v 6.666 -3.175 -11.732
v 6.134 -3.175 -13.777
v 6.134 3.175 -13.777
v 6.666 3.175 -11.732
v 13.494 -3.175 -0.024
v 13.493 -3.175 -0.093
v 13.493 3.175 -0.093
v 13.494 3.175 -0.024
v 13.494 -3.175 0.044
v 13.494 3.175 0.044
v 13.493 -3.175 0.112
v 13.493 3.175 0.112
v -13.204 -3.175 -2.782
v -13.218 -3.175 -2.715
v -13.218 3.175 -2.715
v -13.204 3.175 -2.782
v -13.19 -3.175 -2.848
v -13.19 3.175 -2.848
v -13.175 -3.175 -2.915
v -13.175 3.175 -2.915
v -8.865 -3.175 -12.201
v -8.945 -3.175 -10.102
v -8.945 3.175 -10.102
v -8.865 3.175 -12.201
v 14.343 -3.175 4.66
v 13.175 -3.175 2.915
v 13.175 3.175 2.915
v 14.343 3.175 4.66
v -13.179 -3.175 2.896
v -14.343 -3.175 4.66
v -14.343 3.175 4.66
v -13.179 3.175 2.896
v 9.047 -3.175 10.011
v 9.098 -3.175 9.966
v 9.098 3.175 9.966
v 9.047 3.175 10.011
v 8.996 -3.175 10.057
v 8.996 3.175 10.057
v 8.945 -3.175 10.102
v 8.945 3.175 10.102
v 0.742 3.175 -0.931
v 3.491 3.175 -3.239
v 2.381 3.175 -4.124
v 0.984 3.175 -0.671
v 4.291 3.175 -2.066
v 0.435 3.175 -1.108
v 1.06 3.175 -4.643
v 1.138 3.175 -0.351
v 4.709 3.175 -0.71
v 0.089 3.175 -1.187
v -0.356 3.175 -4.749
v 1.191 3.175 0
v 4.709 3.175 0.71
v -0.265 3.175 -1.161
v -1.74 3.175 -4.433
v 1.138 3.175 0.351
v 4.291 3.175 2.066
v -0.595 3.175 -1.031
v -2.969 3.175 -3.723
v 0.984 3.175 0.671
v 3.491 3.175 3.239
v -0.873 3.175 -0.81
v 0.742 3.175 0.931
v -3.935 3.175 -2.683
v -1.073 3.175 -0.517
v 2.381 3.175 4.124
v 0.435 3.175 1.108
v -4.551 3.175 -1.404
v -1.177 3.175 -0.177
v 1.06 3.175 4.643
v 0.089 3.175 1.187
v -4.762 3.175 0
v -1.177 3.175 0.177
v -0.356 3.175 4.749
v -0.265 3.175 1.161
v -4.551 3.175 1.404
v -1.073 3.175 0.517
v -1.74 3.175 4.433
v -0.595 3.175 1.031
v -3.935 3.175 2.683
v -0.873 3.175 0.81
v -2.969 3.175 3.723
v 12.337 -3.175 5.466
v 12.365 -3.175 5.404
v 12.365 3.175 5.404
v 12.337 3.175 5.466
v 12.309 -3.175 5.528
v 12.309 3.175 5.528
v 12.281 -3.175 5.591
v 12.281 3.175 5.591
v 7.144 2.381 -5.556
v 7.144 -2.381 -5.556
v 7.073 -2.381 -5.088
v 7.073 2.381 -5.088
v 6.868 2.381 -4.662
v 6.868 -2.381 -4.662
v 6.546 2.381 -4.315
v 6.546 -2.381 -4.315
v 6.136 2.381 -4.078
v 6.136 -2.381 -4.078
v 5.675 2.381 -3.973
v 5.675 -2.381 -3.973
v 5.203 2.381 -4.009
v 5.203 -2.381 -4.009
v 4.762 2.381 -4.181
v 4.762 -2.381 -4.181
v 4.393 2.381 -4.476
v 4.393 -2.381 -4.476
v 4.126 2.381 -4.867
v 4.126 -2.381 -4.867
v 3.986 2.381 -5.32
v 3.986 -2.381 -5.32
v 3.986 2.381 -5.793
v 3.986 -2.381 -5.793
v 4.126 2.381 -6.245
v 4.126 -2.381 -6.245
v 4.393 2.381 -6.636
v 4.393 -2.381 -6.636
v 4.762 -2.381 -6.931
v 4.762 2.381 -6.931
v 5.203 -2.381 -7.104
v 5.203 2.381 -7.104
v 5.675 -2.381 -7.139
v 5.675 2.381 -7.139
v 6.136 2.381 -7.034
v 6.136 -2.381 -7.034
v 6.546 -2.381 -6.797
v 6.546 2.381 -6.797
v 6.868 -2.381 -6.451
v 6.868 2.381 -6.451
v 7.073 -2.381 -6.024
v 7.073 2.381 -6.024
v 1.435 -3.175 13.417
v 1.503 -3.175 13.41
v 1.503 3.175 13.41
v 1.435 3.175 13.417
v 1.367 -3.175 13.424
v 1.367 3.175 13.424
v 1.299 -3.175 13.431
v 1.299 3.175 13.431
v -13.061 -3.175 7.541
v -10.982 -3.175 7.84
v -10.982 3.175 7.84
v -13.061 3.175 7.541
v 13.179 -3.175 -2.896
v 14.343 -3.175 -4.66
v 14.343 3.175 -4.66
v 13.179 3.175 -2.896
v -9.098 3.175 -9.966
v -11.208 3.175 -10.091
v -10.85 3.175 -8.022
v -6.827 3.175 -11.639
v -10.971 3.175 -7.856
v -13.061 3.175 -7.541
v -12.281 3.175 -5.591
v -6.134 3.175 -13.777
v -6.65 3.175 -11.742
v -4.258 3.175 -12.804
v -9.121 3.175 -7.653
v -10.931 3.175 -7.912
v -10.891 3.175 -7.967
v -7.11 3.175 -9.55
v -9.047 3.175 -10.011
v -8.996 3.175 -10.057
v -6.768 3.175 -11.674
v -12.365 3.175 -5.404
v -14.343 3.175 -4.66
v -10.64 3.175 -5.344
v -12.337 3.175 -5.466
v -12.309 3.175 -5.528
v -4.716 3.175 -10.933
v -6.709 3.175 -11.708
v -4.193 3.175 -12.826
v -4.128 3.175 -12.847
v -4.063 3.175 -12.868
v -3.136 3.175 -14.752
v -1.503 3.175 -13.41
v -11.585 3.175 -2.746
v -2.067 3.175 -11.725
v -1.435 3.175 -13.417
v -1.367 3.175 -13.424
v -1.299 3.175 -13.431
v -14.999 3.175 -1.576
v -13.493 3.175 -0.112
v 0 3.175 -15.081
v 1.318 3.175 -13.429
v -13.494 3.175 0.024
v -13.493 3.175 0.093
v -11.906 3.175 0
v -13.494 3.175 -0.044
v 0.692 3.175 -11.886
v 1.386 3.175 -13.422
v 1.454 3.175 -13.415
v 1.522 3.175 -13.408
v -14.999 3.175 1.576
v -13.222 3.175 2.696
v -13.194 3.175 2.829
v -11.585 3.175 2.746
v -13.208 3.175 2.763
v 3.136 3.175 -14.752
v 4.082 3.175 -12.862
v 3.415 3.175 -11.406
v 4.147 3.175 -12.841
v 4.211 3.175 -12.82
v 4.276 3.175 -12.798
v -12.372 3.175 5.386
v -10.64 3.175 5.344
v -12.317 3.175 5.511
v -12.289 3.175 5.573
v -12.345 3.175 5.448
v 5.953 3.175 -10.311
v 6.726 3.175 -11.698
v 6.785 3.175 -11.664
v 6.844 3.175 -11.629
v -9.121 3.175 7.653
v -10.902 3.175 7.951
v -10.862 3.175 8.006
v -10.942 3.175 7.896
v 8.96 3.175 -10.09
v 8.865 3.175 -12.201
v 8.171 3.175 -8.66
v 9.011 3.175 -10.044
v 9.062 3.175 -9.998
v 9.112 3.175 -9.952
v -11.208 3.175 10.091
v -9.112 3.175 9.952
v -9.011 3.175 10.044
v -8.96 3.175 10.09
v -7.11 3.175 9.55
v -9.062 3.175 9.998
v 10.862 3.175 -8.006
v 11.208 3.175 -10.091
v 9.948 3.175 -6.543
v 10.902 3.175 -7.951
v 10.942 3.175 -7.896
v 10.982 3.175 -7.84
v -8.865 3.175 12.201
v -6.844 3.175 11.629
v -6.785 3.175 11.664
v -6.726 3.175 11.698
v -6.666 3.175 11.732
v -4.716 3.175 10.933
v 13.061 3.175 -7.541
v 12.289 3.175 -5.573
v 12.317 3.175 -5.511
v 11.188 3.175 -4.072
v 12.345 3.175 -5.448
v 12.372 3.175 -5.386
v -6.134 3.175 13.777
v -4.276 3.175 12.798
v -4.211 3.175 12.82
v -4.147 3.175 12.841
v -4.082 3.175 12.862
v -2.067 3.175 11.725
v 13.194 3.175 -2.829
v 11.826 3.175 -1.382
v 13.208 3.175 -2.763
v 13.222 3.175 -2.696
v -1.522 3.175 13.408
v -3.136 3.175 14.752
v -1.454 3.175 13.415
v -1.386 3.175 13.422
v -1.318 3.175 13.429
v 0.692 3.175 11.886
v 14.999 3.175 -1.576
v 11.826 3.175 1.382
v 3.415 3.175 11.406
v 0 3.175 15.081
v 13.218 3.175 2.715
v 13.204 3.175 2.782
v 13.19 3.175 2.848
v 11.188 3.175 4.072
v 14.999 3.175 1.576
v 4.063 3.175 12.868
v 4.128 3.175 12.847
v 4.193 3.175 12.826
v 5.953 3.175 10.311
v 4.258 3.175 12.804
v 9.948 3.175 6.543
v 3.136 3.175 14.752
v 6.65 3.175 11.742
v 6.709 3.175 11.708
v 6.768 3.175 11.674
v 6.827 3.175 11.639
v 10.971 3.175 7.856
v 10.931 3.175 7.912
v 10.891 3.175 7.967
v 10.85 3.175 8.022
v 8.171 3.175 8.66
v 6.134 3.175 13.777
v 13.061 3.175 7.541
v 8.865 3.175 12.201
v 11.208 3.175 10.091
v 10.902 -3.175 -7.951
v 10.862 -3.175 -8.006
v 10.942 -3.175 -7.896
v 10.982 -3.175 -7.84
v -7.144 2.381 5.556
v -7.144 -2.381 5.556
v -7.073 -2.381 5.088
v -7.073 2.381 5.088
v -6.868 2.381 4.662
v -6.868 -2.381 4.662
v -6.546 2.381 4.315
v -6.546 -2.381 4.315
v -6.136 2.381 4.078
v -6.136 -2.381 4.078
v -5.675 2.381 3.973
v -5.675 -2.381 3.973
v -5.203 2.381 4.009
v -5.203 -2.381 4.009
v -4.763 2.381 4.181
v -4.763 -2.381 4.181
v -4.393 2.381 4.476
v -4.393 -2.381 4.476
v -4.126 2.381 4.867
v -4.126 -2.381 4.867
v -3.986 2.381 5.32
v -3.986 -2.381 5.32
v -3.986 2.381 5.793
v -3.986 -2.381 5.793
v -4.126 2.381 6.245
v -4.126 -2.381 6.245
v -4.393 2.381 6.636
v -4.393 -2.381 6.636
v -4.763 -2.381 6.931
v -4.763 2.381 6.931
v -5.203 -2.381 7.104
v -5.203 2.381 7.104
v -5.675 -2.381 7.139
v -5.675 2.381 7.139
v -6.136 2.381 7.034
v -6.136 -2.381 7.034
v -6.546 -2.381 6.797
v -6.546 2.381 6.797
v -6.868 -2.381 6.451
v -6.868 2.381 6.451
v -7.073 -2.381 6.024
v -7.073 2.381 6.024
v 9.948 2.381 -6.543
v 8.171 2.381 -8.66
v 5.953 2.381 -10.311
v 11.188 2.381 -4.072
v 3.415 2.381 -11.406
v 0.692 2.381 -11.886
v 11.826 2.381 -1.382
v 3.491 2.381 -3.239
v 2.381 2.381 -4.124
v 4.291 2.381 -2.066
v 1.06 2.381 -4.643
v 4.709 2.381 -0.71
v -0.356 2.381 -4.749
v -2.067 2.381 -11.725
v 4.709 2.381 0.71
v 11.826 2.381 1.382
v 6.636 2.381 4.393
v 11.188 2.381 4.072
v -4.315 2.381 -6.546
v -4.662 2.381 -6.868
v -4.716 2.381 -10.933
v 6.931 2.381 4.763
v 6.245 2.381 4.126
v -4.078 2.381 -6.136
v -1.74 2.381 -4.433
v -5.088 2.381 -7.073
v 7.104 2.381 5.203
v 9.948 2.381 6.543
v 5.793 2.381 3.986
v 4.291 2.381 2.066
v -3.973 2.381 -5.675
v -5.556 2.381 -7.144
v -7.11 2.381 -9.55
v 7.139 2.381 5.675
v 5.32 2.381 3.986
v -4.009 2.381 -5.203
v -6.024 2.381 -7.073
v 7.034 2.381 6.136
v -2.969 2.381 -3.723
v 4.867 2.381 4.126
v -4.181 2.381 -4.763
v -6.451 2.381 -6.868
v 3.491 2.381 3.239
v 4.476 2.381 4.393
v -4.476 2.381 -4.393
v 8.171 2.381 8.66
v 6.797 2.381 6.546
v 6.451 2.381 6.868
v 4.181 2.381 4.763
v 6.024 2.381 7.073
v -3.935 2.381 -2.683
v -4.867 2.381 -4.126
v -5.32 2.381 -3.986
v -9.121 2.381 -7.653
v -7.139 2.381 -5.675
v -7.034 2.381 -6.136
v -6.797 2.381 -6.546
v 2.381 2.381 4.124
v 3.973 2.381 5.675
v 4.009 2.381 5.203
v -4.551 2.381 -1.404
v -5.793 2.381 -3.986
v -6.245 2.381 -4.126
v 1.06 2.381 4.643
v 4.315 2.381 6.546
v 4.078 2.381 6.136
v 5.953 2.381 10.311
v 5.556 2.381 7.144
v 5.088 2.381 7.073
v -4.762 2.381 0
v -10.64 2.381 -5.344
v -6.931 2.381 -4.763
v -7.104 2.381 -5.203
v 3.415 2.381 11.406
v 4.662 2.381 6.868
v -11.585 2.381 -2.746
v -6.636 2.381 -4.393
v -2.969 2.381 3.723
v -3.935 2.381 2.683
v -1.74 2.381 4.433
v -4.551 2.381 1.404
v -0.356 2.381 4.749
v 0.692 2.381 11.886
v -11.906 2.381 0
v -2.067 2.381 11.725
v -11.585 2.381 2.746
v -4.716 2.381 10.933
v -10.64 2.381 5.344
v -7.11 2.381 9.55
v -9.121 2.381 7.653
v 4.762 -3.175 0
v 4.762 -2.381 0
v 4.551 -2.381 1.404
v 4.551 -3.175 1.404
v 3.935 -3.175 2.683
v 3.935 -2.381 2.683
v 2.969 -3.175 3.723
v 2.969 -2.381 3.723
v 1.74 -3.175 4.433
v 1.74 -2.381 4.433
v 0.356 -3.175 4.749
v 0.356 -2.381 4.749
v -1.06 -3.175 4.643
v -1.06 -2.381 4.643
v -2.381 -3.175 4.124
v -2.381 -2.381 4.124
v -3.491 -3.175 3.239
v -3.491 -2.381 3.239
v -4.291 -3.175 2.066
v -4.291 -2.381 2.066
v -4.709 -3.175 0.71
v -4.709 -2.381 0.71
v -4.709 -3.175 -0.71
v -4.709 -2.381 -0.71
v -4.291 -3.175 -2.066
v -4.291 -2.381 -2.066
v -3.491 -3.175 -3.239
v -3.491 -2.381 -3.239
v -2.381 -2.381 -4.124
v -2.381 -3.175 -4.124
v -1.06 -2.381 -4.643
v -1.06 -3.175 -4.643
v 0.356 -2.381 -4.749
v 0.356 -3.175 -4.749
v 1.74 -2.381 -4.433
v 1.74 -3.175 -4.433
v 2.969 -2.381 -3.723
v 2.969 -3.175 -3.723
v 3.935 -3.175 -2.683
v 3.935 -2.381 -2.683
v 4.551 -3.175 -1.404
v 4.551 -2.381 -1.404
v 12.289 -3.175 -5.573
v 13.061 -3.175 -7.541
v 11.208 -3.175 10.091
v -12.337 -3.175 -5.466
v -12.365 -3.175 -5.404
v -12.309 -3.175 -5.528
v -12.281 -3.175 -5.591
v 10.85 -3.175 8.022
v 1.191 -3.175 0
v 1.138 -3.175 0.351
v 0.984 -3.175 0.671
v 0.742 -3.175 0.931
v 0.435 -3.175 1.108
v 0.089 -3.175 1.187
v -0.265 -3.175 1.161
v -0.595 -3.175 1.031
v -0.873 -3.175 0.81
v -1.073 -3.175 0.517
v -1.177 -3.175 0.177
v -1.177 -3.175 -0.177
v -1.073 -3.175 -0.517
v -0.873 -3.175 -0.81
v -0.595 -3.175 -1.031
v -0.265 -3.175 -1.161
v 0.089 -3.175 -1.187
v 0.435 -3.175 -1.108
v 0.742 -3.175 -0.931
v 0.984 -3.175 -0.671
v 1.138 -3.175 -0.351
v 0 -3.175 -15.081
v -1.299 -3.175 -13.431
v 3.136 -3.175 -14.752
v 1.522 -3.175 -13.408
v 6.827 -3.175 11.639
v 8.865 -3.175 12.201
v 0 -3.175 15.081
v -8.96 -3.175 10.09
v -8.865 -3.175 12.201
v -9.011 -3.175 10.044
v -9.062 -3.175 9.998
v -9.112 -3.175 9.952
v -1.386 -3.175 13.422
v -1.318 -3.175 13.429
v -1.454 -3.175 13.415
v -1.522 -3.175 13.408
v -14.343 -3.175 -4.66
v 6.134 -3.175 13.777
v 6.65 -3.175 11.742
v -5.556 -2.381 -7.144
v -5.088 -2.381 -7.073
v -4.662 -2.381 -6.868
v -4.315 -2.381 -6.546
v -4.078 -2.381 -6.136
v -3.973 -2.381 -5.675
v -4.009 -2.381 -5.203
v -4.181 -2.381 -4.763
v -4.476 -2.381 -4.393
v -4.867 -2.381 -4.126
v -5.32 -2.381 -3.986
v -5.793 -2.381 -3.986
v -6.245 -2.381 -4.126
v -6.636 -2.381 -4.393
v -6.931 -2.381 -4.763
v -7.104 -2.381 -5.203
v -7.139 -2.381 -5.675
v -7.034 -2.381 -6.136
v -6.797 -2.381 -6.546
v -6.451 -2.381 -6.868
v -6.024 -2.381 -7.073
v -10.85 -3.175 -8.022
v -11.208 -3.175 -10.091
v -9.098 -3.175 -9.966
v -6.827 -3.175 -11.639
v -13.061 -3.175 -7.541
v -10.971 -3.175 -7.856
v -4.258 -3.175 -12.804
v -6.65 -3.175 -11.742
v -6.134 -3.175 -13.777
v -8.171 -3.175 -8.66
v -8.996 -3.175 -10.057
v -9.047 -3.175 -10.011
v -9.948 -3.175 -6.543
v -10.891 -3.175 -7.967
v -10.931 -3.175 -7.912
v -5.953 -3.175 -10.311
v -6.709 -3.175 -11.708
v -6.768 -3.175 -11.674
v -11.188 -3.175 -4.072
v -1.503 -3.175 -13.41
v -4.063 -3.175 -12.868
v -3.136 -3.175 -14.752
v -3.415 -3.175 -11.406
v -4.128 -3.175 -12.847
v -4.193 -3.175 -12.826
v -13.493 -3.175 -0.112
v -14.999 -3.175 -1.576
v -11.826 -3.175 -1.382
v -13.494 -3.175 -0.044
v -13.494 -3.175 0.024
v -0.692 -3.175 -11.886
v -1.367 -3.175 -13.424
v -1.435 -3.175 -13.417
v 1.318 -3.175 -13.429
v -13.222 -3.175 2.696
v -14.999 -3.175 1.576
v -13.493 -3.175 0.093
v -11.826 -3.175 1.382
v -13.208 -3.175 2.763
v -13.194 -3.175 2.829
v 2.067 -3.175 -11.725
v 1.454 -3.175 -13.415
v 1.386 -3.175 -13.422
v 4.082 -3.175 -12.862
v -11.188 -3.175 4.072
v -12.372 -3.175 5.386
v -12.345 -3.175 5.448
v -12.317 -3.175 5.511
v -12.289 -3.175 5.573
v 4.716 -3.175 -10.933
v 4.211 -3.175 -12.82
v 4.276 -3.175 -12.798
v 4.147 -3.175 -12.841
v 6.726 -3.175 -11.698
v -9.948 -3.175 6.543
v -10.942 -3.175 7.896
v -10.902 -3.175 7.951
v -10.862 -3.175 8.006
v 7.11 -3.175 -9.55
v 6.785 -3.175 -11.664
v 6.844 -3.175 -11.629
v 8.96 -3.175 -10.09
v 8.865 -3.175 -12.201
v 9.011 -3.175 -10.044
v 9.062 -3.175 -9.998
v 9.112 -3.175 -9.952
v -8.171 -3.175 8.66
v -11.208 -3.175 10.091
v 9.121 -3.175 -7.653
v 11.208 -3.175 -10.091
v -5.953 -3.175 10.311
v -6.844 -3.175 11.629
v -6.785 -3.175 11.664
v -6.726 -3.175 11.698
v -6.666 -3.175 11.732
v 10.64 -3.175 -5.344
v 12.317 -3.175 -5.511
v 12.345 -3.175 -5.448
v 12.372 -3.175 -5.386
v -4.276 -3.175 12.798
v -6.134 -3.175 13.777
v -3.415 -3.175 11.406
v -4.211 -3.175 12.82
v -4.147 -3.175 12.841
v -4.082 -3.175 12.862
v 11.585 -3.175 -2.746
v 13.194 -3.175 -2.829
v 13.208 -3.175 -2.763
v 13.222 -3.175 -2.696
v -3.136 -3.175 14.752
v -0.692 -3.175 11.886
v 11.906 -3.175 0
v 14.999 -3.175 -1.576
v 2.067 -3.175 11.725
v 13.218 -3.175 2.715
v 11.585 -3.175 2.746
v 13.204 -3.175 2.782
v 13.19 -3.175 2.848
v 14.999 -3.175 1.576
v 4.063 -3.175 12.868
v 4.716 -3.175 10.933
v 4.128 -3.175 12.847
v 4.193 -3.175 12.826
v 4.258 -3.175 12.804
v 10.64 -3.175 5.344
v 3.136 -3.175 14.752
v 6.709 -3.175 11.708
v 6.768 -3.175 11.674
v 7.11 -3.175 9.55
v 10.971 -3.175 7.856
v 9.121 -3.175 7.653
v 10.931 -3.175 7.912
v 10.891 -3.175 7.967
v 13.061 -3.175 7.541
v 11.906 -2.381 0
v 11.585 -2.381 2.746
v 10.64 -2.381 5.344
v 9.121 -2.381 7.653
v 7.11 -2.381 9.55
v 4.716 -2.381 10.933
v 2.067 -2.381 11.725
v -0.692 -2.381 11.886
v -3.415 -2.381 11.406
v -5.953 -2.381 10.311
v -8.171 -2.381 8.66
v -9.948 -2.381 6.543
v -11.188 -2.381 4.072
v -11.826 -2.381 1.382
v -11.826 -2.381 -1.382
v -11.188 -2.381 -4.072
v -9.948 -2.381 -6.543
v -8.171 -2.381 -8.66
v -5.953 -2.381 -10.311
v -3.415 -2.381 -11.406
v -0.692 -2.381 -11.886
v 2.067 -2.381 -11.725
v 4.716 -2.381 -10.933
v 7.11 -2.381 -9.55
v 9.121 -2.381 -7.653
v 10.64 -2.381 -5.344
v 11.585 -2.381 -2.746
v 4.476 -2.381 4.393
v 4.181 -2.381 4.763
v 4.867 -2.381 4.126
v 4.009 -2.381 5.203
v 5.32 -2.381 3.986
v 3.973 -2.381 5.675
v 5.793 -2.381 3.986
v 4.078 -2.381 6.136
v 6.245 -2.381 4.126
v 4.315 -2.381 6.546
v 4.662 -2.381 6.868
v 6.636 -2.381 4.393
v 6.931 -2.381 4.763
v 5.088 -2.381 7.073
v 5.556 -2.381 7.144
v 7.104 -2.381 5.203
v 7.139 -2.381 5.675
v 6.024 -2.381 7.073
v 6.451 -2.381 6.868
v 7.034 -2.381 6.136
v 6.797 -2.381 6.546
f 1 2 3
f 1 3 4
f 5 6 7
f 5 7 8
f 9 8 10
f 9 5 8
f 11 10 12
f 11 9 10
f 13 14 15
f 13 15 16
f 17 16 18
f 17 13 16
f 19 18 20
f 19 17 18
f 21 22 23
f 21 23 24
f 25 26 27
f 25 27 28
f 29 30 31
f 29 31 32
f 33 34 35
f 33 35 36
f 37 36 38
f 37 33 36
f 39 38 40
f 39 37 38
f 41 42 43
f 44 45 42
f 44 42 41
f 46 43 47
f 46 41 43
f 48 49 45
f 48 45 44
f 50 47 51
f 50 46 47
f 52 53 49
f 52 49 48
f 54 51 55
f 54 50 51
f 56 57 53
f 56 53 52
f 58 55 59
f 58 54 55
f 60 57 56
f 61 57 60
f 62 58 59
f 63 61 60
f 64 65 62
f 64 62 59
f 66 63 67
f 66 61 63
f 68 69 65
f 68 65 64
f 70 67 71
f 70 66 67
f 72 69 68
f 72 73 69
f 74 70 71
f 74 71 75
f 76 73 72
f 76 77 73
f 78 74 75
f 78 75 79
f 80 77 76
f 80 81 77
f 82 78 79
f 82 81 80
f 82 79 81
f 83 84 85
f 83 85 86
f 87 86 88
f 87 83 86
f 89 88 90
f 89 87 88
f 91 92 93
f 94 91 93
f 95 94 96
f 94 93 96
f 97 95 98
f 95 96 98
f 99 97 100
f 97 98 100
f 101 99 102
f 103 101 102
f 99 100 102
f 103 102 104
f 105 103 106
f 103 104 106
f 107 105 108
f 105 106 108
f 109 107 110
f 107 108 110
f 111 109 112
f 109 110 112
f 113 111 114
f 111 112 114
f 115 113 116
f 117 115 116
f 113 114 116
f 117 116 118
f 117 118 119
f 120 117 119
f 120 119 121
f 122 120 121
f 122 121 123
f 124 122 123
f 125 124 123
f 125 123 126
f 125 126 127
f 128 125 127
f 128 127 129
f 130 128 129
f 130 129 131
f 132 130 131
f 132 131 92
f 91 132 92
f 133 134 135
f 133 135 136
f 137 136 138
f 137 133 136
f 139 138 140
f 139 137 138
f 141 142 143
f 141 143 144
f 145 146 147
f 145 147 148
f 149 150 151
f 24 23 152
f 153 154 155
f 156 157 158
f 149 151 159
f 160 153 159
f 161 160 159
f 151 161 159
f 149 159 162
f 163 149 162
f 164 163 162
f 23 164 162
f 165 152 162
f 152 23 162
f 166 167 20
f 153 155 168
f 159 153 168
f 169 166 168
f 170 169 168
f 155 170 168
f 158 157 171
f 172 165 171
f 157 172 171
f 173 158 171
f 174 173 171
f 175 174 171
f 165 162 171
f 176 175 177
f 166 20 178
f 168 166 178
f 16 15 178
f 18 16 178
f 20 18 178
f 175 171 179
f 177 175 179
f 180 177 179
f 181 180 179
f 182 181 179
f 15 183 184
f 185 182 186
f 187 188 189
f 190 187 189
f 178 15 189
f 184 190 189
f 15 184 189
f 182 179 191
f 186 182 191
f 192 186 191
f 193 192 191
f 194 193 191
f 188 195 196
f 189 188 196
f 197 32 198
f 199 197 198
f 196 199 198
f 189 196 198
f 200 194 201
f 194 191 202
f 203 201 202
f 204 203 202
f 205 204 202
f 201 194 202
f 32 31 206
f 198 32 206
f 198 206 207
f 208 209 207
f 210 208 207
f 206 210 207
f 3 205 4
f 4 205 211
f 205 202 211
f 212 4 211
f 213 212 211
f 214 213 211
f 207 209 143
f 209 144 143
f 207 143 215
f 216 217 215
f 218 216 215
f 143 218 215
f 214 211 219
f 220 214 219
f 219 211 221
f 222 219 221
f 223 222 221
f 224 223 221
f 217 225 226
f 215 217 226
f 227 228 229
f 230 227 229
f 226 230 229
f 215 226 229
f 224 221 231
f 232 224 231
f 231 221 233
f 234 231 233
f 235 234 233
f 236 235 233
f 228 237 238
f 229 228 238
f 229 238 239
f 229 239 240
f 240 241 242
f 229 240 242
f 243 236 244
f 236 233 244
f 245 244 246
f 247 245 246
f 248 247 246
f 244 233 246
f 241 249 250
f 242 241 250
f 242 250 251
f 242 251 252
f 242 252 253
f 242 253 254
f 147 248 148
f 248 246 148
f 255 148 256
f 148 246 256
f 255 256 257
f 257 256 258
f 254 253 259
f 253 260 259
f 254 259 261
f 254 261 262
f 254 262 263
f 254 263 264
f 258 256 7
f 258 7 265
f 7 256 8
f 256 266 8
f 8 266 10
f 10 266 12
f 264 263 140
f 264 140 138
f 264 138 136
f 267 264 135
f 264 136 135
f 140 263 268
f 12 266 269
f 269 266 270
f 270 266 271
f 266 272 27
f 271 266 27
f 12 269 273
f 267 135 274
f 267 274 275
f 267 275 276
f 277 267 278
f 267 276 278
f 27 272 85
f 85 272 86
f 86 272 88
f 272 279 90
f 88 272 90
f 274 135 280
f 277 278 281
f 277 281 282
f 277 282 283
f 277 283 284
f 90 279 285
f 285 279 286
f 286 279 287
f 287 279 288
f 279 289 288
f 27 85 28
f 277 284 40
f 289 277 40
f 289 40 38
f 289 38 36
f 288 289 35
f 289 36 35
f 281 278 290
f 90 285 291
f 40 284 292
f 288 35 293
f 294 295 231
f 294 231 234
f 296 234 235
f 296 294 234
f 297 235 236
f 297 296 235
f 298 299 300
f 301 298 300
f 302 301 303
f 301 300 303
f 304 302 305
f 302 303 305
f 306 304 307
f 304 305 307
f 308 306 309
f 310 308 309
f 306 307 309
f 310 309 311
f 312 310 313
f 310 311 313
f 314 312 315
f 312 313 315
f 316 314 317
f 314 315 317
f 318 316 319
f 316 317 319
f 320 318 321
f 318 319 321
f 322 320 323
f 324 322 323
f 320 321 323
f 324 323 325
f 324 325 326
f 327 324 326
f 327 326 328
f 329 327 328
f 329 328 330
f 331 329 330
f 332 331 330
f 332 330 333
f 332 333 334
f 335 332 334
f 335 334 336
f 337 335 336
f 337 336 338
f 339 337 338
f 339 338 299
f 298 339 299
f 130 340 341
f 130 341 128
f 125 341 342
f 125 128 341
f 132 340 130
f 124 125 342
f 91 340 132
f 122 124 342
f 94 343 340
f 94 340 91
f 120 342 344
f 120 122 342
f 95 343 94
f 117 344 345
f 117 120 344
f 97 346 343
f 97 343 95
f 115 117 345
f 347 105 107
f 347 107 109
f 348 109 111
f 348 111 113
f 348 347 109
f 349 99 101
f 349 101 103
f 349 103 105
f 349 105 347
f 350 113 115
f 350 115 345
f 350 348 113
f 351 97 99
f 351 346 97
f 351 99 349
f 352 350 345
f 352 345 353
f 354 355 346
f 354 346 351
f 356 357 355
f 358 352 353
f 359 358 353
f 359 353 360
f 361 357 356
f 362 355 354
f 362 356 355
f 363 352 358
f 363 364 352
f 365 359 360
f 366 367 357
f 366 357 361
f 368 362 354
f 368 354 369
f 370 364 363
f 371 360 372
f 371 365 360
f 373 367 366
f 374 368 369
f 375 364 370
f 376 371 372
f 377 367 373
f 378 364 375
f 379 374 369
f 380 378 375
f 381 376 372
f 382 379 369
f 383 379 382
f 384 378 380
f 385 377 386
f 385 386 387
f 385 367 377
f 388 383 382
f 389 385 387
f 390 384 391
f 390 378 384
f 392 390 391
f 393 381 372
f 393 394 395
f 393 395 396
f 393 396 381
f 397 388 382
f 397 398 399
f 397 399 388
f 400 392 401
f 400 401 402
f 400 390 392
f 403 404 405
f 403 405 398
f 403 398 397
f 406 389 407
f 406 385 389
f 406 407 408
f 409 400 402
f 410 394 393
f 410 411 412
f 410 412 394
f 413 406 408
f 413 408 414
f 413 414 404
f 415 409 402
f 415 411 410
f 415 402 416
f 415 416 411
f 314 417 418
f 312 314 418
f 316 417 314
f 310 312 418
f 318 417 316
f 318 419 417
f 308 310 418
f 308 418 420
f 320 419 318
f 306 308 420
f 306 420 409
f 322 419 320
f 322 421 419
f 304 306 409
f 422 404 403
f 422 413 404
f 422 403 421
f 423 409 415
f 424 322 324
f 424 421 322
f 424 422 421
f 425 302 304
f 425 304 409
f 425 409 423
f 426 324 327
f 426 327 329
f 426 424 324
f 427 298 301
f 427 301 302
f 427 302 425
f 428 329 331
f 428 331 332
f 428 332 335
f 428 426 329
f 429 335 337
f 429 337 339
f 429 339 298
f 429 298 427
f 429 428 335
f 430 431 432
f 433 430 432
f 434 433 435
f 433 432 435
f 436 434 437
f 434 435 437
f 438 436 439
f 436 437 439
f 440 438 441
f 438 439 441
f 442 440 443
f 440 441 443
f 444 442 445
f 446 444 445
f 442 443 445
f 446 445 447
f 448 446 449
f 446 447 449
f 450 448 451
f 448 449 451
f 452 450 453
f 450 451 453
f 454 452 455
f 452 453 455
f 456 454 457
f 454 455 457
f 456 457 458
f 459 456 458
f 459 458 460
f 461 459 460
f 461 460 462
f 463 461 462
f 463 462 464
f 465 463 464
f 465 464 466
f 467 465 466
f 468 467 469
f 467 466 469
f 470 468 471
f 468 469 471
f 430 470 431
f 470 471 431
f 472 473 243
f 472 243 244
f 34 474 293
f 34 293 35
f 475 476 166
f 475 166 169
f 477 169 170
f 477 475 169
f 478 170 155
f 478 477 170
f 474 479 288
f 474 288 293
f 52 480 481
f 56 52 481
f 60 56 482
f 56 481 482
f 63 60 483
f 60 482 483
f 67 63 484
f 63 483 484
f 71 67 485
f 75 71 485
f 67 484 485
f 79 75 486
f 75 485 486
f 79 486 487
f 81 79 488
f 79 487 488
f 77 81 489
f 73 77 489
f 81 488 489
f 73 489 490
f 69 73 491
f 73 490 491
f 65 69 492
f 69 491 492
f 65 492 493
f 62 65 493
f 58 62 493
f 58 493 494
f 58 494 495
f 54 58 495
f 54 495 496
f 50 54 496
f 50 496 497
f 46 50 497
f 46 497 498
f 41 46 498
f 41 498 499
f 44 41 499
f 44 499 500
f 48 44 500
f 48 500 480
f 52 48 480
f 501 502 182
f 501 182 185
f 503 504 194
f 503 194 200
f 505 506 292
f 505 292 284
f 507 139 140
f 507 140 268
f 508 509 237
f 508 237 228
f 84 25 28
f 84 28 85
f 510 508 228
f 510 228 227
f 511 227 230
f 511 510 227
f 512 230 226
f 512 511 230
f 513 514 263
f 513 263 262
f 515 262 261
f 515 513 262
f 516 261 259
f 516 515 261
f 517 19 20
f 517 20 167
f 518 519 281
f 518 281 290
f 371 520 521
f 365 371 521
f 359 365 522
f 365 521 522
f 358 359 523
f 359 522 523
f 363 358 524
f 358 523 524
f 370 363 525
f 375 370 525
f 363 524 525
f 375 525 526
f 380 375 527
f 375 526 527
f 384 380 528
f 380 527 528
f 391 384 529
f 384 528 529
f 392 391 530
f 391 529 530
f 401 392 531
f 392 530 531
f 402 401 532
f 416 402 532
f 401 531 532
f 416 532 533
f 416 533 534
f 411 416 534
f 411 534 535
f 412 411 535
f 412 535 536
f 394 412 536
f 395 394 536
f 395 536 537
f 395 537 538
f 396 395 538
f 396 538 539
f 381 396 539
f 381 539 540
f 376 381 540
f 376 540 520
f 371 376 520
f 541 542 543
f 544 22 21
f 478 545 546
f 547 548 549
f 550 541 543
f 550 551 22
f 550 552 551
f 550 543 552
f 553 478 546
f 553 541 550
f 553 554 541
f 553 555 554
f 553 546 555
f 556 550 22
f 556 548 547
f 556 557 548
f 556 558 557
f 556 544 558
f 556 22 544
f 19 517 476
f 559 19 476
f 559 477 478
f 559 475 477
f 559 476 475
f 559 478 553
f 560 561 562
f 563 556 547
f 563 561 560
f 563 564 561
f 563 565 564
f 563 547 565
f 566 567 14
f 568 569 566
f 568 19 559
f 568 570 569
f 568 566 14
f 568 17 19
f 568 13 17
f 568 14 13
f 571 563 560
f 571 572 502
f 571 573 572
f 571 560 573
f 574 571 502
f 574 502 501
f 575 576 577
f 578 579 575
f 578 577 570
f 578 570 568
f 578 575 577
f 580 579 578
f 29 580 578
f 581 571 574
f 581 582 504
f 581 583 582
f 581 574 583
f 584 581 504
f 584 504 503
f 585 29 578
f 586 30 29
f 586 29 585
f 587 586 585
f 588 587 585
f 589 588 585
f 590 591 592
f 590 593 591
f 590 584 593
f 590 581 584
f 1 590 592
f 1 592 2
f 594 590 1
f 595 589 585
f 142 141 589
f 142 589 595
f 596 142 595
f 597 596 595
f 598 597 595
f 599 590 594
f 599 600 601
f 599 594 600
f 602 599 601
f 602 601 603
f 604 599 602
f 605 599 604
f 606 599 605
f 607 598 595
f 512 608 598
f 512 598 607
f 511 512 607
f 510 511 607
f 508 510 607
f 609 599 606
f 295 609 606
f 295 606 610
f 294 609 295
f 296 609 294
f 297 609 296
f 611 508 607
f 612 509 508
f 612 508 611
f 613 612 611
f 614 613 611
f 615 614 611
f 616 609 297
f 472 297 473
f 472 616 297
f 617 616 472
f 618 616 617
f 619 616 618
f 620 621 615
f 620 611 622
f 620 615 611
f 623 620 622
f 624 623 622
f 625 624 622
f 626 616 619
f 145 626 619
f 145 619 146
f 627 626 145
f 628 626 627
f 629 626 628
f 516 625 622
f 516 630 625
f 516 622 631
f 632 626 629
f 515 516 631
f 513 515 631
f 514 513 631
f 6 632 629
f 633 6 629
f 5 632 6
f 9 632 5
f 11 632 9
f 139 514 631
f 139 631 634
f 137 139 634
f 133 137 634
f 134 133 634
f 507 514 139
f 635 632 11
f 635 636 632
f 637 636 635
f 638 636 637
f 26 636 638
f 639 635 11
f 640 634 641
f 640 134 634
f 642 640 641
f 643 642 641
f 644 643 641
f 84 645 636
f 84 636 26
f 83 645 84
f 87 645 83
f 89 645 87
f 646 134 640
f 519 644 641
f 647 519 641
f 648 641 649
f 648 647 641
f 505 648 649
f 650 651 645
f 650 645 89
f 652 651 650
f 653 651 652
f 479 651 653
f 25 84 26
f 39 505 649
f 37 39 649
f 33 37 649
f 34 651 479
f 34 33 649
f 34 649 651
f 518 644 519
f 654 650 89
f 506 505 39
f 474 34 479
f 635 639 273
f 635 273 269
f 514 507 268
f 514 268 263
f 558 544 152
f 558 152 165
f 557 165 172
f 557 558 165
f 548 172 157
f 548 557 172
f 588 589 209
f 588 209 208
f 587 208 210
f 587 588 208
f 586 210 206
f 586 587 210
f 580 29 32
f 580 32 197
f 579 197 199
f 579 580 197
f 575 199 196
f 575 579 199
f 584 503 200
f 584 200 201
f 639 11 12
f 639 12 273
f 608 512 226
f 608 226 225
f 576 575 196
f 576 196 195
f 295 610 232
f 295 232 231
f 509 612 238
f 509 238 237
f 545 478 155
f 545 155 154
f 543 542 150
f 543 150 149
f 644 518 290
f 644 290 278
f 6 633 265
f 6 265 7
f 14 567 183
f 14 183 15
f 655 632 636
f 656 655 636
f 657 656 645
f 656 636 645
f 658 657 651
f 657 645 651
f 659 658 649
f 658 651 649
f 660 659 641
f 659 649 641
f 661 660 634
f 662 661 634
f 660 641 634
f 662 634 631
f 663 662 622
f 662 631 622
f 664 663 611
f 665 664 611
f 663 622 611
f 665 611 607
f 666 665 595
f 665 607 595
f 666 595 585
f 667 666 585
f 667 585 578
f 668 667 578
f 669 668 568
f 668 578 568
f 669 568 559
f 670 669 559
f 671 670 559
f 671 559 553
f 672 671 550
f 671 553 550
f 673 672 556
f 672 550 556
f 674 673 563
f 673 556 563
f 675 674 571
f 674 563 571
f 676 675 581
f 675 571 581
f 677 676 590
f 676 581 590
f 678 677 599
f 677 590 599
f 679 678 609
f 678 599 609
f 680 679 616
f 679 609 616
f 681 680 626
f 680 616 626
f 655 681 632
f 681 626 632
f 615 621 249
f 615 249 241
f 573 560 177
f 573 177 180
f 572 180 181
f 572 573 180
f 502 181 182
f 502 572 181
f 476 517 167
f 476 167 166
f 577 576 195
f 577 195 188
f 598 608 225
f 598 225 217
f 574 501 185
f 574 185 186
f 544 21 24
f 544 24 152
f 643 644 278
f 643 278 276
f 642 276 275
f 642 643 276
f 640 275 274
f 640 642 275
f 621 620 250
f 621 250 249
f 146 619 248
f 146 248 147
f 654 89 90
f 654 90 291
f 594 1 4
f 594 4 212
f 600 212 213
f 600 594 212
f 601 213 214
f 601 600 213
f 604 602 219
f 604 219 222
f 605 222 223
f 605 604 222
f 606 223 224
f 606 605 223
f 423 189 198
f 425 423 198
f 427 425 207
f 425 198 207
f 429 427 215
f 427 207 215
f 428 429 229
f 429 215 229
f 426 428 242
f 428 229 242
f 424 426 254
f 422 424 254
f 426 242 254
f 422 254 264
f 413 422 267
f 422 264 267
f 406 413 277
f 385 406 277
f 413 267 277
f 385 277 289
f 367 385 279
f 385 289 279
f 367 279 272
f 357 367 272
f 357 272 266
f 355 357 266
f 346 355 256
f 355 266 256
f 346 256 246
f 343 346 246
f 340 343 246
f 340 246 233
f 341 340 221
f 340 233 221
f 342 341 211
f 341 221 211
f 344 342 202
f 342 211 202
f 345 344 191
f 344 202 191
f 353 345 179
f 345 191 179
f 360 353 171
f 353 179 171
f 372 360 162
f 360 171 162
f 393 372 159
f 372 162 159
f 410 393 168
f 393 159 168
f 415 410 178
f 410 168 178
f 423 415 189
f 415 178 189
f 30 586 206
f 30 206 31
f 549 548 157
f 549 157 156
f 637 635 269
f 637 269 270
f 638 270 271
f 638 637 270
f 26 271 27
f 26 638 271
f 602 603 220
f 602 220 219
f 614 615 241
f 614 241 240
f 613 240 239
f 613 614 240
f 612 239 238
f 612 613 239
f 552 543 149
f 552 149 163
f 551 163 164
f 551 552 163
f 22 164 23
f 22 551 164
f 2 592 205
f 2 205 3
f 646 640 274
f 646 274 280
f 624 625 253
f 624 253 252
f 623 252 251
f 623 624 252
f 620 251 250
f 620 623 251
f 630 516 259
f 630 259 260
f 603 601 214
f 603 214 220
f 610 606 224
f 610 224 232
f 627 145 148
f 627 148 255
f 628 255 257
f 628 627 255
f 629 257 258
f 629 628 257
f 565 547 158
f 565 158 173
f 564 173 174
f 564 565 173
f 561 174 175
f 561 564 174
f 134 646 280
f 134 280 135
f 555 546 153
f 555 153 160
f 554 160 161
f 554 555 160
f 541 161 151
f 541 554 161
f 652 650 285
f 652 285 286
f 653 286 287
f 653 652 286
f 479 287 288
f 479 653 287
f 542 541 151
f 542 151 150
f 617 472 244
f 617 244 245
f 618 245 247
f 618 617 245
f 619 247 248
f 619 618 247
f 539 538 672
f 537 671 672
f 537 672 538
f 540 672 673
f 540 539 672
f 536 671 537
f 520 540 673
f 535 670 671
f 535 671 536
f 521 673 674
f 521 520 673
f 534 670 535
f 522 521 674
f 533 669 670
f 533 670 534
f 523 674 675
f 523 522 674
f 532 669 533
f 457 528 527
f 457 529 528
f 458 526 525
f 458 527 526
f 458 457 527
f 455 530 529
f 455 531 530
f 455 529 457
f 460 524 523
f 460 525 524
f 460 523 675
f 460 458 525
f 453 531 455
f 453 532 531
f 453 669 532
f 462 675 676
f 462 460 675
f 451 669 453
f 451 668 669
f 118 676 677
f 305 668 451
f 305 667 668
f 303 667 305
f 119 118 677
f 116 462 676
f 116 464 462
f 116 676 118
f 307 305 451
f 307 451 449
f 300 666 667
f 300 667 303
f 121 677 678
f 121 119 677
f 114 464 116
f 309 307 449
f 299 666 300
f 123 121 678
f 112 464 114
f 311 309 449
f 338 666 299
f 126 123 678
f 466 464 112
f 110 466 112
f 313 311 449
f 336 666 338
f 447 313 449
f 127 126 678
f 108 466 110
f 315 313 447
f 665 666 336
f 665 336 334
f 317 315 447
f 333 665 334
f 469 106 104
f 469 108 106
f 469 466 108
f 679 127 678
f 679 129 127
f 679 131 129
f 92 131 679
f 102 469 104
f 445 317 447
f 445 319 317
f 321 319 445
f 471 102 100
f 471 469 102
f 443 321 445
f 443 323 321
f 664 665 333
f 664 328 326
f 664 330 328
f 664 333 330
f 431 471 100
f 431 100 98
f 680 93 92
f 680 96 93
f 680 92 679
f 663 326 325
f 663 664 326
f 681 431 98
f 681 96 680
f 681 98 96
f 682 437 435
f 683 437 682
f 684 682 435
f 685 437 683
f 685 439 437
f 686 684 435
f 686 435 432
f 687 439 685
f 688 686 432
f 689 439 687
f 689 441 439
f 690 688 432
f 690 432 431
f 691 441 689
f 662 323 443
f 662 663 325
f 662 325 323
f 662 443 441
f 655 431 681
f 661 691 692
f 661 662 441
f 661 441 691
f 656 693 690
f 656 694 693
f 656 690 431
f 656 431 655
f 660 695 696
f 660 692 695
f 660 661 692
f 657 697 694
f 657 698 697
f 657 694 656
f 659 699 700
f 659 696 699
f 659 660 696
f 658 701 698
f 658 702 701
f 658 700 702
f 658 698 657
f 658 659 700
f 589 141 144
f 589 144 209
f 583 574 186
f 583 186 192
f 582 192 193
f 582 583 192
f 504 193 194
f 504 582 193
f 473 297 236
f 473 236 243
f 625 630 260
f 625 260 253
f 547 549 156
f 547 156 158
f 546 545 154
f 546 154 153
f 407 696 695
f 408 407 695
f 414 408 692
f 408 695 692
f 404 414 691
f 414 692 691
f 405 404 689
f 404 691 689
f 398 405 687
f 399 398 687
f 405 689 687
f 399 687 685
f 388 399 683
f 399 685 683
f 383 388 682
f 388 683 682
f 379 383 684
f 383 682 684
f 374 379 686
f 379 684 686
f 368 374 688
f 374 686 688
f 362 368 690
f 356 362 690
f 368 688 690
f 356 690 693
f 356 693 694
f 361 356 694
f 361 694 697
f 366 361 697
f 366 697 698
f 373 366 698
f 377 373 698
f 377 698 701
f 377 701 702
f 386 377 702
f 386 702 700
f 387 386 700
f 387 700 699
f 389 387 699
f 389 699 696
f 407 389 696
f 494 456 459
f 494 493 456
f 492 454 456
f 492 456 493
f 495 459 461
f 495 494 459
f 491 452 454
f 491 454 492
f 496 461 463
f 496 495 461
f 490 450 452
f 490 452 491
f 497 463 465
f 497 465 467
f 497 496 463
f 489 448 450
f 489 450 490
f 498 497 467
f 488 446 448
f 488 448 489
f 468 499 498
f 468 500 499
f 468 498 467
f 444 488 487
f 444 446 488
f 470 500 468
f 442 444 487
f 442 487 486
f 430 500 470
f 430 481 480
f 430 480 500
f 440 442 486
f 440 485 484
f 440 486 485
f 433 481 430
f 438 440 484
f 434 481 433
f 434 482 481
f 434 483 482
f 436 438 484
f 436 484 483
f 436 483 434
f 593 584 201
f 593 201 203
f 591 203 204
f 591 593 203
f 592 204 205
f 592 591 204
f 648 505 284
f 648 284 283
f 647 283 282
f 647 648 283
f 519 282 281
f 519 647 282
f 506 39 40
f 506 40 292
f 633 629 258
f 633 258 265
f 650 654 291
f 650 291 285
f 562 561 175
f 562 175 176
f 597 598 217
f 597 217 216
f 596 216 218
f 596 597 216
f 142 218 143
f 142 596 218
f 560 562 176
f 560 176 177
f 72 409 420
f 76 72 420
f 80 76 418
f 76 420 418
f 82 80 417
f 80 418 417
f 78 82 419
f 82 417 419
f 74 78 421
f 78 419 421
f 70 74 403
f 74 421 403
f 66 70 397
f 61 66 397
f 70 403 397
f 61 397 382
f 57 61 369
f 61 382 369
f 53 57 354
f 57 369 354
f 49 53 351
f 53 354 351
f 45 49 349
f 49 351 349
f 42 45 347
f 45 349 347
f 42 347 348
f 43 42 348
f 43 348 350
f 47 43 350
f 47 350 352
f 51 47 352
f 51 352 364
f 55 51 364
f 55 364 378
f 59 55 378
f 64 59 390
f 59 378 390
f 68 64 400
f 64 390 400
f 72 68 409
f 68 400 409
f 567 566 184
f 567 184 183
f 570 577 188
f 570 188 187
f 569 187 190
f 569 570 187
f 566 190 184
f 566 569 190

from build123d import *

# Parameters (mm, degrees)
F0_R             = 13.49375
F1_DEPTH         = 3.175
F3_DEPTH         = 6.35
F3_COPIES_COUNT  = 30
F4_R             = 11.90625
F5_DEPTH         = 0.79375
F6_R             = 11.90625
F7_DEPTH         = 0.79375
F9_R             = 4.7625
F10_DEPTH        = 0.79375
F8_R             = 4.7625
F11_DEPTH        = 0.79375
F12_R            = 1.190625
F13_DEPTH        = 6.351
F14_R            = 1.5875
F15_DEPTH        = 5.55725
F15_COPIES_COUNT = 4


# Not quite as in the source:
# - a pattern or mirror of a feature is missing from the dataset's text; its kind, count and spacing are read off the source's solid


with BuildPart() as f1:
    # F0 (on Front) → F1 (new body, symmetric)
    with BuildSketch(Plane.XZ):
        Circle(F0_R)
    extrude(amount=F1_DEPTH, both=True)

    # F2 (on face) → F3 (join, through all)
    with BuildSketch(Plane.XZ.offset(3.175)):
        with BuildLine():
            Line((0, 15.08125), (-1.3182605719, 13.4292024382))
            ThreePointArc((-1.3182605719, 13.4292024382), (-0.6599199427, 13.4776034491), (0, 13.49375))
            Line((0, 13.49375), (0, 15.08125))
        make_face()
        with BuildLine():
            Line((1.2989129689, 13.4310876016), (0, 15.08125))
            Line((0, 15.08125), (0, 13.49375))
            ThreePointArc((0, 13.49375), (0.650211788, 13.4780752963), (1.2989129689, 13.4310876016))
        make_face()
    f3 = extrude(amount=-F3_DEPTH)

    # F3_copies: F3 ×30 about axis
    f3_copies_axis = Axis((0, 0, 0), (0, 1, 0))
    for i in range(1, F3_COPIES_COUNT):
        add(f3.rotate(f3_copies_axis, i * 360 / F3_COPIES_COUNT))

    # F4 (on face) → F5 (cut)
    with BuildSketch(Plane.XZ.offset(3.175)):
        Circle(F4_R)
    extrude(amount=-F5_DEPTH, mode=Mode.SUBTRACT)

    # F6 (on face) → F7 (cut)
    with BuildSketch(Plane(origin=(0, 3.175, 0), x_dir=(-1, 0, 0), z_dir=(0, 1, 0))):
        Circle(F6_R)
    extrude(amount=-F7_DEPTH, mode=Mode.SUBTRACT)

    # F9 (on face) → F10 (join)
    with BuildSketch(Plane(origin=(0, 2.38125, 0), x_dir=(-1, 0, 0), z_dir=(0, 1, 0))):
        Circle(F9_R)
    extrude(amount=F10_DEPTH)

    # F8 (on face) → F11 (join)
    with BuildSketch(Plane.XZ.offset(2.38125)):
        Circle(F8_R)
    extrude(amount=F11_DEPTH)

    # F12 (on face) → F13 (cut, through all)
    with BuildSketch(Plane.XZ.offset(3.175)):
        Circle(F12_R)
    extrude(amount=-F13_DEPTH, mode=Mode.SUBTRACT)

    # F14 (on face) → F15 (cut, through all)
    with BuildSketch(Plane.XZ.offset(2.38125)):
        with Locations((5.55625, -5.55625)):
            Circle(F14_R)
    f15 = extrude(amount=-F15_DEPTH, mode=Mode.SUBTRACT)

    # F15_copies: F15 ×4 about axis
    f15_copies_axis = Axis((0, 0, 0), (0, 1, 0))
    for i in range(1, F15_COPIES_COUNT):
        add(f15.rotate(f15_copies_axis, i * 360 / F15_COPIES_COUNT), mode=Mode.SUBTRACT)


solid = f1.part
